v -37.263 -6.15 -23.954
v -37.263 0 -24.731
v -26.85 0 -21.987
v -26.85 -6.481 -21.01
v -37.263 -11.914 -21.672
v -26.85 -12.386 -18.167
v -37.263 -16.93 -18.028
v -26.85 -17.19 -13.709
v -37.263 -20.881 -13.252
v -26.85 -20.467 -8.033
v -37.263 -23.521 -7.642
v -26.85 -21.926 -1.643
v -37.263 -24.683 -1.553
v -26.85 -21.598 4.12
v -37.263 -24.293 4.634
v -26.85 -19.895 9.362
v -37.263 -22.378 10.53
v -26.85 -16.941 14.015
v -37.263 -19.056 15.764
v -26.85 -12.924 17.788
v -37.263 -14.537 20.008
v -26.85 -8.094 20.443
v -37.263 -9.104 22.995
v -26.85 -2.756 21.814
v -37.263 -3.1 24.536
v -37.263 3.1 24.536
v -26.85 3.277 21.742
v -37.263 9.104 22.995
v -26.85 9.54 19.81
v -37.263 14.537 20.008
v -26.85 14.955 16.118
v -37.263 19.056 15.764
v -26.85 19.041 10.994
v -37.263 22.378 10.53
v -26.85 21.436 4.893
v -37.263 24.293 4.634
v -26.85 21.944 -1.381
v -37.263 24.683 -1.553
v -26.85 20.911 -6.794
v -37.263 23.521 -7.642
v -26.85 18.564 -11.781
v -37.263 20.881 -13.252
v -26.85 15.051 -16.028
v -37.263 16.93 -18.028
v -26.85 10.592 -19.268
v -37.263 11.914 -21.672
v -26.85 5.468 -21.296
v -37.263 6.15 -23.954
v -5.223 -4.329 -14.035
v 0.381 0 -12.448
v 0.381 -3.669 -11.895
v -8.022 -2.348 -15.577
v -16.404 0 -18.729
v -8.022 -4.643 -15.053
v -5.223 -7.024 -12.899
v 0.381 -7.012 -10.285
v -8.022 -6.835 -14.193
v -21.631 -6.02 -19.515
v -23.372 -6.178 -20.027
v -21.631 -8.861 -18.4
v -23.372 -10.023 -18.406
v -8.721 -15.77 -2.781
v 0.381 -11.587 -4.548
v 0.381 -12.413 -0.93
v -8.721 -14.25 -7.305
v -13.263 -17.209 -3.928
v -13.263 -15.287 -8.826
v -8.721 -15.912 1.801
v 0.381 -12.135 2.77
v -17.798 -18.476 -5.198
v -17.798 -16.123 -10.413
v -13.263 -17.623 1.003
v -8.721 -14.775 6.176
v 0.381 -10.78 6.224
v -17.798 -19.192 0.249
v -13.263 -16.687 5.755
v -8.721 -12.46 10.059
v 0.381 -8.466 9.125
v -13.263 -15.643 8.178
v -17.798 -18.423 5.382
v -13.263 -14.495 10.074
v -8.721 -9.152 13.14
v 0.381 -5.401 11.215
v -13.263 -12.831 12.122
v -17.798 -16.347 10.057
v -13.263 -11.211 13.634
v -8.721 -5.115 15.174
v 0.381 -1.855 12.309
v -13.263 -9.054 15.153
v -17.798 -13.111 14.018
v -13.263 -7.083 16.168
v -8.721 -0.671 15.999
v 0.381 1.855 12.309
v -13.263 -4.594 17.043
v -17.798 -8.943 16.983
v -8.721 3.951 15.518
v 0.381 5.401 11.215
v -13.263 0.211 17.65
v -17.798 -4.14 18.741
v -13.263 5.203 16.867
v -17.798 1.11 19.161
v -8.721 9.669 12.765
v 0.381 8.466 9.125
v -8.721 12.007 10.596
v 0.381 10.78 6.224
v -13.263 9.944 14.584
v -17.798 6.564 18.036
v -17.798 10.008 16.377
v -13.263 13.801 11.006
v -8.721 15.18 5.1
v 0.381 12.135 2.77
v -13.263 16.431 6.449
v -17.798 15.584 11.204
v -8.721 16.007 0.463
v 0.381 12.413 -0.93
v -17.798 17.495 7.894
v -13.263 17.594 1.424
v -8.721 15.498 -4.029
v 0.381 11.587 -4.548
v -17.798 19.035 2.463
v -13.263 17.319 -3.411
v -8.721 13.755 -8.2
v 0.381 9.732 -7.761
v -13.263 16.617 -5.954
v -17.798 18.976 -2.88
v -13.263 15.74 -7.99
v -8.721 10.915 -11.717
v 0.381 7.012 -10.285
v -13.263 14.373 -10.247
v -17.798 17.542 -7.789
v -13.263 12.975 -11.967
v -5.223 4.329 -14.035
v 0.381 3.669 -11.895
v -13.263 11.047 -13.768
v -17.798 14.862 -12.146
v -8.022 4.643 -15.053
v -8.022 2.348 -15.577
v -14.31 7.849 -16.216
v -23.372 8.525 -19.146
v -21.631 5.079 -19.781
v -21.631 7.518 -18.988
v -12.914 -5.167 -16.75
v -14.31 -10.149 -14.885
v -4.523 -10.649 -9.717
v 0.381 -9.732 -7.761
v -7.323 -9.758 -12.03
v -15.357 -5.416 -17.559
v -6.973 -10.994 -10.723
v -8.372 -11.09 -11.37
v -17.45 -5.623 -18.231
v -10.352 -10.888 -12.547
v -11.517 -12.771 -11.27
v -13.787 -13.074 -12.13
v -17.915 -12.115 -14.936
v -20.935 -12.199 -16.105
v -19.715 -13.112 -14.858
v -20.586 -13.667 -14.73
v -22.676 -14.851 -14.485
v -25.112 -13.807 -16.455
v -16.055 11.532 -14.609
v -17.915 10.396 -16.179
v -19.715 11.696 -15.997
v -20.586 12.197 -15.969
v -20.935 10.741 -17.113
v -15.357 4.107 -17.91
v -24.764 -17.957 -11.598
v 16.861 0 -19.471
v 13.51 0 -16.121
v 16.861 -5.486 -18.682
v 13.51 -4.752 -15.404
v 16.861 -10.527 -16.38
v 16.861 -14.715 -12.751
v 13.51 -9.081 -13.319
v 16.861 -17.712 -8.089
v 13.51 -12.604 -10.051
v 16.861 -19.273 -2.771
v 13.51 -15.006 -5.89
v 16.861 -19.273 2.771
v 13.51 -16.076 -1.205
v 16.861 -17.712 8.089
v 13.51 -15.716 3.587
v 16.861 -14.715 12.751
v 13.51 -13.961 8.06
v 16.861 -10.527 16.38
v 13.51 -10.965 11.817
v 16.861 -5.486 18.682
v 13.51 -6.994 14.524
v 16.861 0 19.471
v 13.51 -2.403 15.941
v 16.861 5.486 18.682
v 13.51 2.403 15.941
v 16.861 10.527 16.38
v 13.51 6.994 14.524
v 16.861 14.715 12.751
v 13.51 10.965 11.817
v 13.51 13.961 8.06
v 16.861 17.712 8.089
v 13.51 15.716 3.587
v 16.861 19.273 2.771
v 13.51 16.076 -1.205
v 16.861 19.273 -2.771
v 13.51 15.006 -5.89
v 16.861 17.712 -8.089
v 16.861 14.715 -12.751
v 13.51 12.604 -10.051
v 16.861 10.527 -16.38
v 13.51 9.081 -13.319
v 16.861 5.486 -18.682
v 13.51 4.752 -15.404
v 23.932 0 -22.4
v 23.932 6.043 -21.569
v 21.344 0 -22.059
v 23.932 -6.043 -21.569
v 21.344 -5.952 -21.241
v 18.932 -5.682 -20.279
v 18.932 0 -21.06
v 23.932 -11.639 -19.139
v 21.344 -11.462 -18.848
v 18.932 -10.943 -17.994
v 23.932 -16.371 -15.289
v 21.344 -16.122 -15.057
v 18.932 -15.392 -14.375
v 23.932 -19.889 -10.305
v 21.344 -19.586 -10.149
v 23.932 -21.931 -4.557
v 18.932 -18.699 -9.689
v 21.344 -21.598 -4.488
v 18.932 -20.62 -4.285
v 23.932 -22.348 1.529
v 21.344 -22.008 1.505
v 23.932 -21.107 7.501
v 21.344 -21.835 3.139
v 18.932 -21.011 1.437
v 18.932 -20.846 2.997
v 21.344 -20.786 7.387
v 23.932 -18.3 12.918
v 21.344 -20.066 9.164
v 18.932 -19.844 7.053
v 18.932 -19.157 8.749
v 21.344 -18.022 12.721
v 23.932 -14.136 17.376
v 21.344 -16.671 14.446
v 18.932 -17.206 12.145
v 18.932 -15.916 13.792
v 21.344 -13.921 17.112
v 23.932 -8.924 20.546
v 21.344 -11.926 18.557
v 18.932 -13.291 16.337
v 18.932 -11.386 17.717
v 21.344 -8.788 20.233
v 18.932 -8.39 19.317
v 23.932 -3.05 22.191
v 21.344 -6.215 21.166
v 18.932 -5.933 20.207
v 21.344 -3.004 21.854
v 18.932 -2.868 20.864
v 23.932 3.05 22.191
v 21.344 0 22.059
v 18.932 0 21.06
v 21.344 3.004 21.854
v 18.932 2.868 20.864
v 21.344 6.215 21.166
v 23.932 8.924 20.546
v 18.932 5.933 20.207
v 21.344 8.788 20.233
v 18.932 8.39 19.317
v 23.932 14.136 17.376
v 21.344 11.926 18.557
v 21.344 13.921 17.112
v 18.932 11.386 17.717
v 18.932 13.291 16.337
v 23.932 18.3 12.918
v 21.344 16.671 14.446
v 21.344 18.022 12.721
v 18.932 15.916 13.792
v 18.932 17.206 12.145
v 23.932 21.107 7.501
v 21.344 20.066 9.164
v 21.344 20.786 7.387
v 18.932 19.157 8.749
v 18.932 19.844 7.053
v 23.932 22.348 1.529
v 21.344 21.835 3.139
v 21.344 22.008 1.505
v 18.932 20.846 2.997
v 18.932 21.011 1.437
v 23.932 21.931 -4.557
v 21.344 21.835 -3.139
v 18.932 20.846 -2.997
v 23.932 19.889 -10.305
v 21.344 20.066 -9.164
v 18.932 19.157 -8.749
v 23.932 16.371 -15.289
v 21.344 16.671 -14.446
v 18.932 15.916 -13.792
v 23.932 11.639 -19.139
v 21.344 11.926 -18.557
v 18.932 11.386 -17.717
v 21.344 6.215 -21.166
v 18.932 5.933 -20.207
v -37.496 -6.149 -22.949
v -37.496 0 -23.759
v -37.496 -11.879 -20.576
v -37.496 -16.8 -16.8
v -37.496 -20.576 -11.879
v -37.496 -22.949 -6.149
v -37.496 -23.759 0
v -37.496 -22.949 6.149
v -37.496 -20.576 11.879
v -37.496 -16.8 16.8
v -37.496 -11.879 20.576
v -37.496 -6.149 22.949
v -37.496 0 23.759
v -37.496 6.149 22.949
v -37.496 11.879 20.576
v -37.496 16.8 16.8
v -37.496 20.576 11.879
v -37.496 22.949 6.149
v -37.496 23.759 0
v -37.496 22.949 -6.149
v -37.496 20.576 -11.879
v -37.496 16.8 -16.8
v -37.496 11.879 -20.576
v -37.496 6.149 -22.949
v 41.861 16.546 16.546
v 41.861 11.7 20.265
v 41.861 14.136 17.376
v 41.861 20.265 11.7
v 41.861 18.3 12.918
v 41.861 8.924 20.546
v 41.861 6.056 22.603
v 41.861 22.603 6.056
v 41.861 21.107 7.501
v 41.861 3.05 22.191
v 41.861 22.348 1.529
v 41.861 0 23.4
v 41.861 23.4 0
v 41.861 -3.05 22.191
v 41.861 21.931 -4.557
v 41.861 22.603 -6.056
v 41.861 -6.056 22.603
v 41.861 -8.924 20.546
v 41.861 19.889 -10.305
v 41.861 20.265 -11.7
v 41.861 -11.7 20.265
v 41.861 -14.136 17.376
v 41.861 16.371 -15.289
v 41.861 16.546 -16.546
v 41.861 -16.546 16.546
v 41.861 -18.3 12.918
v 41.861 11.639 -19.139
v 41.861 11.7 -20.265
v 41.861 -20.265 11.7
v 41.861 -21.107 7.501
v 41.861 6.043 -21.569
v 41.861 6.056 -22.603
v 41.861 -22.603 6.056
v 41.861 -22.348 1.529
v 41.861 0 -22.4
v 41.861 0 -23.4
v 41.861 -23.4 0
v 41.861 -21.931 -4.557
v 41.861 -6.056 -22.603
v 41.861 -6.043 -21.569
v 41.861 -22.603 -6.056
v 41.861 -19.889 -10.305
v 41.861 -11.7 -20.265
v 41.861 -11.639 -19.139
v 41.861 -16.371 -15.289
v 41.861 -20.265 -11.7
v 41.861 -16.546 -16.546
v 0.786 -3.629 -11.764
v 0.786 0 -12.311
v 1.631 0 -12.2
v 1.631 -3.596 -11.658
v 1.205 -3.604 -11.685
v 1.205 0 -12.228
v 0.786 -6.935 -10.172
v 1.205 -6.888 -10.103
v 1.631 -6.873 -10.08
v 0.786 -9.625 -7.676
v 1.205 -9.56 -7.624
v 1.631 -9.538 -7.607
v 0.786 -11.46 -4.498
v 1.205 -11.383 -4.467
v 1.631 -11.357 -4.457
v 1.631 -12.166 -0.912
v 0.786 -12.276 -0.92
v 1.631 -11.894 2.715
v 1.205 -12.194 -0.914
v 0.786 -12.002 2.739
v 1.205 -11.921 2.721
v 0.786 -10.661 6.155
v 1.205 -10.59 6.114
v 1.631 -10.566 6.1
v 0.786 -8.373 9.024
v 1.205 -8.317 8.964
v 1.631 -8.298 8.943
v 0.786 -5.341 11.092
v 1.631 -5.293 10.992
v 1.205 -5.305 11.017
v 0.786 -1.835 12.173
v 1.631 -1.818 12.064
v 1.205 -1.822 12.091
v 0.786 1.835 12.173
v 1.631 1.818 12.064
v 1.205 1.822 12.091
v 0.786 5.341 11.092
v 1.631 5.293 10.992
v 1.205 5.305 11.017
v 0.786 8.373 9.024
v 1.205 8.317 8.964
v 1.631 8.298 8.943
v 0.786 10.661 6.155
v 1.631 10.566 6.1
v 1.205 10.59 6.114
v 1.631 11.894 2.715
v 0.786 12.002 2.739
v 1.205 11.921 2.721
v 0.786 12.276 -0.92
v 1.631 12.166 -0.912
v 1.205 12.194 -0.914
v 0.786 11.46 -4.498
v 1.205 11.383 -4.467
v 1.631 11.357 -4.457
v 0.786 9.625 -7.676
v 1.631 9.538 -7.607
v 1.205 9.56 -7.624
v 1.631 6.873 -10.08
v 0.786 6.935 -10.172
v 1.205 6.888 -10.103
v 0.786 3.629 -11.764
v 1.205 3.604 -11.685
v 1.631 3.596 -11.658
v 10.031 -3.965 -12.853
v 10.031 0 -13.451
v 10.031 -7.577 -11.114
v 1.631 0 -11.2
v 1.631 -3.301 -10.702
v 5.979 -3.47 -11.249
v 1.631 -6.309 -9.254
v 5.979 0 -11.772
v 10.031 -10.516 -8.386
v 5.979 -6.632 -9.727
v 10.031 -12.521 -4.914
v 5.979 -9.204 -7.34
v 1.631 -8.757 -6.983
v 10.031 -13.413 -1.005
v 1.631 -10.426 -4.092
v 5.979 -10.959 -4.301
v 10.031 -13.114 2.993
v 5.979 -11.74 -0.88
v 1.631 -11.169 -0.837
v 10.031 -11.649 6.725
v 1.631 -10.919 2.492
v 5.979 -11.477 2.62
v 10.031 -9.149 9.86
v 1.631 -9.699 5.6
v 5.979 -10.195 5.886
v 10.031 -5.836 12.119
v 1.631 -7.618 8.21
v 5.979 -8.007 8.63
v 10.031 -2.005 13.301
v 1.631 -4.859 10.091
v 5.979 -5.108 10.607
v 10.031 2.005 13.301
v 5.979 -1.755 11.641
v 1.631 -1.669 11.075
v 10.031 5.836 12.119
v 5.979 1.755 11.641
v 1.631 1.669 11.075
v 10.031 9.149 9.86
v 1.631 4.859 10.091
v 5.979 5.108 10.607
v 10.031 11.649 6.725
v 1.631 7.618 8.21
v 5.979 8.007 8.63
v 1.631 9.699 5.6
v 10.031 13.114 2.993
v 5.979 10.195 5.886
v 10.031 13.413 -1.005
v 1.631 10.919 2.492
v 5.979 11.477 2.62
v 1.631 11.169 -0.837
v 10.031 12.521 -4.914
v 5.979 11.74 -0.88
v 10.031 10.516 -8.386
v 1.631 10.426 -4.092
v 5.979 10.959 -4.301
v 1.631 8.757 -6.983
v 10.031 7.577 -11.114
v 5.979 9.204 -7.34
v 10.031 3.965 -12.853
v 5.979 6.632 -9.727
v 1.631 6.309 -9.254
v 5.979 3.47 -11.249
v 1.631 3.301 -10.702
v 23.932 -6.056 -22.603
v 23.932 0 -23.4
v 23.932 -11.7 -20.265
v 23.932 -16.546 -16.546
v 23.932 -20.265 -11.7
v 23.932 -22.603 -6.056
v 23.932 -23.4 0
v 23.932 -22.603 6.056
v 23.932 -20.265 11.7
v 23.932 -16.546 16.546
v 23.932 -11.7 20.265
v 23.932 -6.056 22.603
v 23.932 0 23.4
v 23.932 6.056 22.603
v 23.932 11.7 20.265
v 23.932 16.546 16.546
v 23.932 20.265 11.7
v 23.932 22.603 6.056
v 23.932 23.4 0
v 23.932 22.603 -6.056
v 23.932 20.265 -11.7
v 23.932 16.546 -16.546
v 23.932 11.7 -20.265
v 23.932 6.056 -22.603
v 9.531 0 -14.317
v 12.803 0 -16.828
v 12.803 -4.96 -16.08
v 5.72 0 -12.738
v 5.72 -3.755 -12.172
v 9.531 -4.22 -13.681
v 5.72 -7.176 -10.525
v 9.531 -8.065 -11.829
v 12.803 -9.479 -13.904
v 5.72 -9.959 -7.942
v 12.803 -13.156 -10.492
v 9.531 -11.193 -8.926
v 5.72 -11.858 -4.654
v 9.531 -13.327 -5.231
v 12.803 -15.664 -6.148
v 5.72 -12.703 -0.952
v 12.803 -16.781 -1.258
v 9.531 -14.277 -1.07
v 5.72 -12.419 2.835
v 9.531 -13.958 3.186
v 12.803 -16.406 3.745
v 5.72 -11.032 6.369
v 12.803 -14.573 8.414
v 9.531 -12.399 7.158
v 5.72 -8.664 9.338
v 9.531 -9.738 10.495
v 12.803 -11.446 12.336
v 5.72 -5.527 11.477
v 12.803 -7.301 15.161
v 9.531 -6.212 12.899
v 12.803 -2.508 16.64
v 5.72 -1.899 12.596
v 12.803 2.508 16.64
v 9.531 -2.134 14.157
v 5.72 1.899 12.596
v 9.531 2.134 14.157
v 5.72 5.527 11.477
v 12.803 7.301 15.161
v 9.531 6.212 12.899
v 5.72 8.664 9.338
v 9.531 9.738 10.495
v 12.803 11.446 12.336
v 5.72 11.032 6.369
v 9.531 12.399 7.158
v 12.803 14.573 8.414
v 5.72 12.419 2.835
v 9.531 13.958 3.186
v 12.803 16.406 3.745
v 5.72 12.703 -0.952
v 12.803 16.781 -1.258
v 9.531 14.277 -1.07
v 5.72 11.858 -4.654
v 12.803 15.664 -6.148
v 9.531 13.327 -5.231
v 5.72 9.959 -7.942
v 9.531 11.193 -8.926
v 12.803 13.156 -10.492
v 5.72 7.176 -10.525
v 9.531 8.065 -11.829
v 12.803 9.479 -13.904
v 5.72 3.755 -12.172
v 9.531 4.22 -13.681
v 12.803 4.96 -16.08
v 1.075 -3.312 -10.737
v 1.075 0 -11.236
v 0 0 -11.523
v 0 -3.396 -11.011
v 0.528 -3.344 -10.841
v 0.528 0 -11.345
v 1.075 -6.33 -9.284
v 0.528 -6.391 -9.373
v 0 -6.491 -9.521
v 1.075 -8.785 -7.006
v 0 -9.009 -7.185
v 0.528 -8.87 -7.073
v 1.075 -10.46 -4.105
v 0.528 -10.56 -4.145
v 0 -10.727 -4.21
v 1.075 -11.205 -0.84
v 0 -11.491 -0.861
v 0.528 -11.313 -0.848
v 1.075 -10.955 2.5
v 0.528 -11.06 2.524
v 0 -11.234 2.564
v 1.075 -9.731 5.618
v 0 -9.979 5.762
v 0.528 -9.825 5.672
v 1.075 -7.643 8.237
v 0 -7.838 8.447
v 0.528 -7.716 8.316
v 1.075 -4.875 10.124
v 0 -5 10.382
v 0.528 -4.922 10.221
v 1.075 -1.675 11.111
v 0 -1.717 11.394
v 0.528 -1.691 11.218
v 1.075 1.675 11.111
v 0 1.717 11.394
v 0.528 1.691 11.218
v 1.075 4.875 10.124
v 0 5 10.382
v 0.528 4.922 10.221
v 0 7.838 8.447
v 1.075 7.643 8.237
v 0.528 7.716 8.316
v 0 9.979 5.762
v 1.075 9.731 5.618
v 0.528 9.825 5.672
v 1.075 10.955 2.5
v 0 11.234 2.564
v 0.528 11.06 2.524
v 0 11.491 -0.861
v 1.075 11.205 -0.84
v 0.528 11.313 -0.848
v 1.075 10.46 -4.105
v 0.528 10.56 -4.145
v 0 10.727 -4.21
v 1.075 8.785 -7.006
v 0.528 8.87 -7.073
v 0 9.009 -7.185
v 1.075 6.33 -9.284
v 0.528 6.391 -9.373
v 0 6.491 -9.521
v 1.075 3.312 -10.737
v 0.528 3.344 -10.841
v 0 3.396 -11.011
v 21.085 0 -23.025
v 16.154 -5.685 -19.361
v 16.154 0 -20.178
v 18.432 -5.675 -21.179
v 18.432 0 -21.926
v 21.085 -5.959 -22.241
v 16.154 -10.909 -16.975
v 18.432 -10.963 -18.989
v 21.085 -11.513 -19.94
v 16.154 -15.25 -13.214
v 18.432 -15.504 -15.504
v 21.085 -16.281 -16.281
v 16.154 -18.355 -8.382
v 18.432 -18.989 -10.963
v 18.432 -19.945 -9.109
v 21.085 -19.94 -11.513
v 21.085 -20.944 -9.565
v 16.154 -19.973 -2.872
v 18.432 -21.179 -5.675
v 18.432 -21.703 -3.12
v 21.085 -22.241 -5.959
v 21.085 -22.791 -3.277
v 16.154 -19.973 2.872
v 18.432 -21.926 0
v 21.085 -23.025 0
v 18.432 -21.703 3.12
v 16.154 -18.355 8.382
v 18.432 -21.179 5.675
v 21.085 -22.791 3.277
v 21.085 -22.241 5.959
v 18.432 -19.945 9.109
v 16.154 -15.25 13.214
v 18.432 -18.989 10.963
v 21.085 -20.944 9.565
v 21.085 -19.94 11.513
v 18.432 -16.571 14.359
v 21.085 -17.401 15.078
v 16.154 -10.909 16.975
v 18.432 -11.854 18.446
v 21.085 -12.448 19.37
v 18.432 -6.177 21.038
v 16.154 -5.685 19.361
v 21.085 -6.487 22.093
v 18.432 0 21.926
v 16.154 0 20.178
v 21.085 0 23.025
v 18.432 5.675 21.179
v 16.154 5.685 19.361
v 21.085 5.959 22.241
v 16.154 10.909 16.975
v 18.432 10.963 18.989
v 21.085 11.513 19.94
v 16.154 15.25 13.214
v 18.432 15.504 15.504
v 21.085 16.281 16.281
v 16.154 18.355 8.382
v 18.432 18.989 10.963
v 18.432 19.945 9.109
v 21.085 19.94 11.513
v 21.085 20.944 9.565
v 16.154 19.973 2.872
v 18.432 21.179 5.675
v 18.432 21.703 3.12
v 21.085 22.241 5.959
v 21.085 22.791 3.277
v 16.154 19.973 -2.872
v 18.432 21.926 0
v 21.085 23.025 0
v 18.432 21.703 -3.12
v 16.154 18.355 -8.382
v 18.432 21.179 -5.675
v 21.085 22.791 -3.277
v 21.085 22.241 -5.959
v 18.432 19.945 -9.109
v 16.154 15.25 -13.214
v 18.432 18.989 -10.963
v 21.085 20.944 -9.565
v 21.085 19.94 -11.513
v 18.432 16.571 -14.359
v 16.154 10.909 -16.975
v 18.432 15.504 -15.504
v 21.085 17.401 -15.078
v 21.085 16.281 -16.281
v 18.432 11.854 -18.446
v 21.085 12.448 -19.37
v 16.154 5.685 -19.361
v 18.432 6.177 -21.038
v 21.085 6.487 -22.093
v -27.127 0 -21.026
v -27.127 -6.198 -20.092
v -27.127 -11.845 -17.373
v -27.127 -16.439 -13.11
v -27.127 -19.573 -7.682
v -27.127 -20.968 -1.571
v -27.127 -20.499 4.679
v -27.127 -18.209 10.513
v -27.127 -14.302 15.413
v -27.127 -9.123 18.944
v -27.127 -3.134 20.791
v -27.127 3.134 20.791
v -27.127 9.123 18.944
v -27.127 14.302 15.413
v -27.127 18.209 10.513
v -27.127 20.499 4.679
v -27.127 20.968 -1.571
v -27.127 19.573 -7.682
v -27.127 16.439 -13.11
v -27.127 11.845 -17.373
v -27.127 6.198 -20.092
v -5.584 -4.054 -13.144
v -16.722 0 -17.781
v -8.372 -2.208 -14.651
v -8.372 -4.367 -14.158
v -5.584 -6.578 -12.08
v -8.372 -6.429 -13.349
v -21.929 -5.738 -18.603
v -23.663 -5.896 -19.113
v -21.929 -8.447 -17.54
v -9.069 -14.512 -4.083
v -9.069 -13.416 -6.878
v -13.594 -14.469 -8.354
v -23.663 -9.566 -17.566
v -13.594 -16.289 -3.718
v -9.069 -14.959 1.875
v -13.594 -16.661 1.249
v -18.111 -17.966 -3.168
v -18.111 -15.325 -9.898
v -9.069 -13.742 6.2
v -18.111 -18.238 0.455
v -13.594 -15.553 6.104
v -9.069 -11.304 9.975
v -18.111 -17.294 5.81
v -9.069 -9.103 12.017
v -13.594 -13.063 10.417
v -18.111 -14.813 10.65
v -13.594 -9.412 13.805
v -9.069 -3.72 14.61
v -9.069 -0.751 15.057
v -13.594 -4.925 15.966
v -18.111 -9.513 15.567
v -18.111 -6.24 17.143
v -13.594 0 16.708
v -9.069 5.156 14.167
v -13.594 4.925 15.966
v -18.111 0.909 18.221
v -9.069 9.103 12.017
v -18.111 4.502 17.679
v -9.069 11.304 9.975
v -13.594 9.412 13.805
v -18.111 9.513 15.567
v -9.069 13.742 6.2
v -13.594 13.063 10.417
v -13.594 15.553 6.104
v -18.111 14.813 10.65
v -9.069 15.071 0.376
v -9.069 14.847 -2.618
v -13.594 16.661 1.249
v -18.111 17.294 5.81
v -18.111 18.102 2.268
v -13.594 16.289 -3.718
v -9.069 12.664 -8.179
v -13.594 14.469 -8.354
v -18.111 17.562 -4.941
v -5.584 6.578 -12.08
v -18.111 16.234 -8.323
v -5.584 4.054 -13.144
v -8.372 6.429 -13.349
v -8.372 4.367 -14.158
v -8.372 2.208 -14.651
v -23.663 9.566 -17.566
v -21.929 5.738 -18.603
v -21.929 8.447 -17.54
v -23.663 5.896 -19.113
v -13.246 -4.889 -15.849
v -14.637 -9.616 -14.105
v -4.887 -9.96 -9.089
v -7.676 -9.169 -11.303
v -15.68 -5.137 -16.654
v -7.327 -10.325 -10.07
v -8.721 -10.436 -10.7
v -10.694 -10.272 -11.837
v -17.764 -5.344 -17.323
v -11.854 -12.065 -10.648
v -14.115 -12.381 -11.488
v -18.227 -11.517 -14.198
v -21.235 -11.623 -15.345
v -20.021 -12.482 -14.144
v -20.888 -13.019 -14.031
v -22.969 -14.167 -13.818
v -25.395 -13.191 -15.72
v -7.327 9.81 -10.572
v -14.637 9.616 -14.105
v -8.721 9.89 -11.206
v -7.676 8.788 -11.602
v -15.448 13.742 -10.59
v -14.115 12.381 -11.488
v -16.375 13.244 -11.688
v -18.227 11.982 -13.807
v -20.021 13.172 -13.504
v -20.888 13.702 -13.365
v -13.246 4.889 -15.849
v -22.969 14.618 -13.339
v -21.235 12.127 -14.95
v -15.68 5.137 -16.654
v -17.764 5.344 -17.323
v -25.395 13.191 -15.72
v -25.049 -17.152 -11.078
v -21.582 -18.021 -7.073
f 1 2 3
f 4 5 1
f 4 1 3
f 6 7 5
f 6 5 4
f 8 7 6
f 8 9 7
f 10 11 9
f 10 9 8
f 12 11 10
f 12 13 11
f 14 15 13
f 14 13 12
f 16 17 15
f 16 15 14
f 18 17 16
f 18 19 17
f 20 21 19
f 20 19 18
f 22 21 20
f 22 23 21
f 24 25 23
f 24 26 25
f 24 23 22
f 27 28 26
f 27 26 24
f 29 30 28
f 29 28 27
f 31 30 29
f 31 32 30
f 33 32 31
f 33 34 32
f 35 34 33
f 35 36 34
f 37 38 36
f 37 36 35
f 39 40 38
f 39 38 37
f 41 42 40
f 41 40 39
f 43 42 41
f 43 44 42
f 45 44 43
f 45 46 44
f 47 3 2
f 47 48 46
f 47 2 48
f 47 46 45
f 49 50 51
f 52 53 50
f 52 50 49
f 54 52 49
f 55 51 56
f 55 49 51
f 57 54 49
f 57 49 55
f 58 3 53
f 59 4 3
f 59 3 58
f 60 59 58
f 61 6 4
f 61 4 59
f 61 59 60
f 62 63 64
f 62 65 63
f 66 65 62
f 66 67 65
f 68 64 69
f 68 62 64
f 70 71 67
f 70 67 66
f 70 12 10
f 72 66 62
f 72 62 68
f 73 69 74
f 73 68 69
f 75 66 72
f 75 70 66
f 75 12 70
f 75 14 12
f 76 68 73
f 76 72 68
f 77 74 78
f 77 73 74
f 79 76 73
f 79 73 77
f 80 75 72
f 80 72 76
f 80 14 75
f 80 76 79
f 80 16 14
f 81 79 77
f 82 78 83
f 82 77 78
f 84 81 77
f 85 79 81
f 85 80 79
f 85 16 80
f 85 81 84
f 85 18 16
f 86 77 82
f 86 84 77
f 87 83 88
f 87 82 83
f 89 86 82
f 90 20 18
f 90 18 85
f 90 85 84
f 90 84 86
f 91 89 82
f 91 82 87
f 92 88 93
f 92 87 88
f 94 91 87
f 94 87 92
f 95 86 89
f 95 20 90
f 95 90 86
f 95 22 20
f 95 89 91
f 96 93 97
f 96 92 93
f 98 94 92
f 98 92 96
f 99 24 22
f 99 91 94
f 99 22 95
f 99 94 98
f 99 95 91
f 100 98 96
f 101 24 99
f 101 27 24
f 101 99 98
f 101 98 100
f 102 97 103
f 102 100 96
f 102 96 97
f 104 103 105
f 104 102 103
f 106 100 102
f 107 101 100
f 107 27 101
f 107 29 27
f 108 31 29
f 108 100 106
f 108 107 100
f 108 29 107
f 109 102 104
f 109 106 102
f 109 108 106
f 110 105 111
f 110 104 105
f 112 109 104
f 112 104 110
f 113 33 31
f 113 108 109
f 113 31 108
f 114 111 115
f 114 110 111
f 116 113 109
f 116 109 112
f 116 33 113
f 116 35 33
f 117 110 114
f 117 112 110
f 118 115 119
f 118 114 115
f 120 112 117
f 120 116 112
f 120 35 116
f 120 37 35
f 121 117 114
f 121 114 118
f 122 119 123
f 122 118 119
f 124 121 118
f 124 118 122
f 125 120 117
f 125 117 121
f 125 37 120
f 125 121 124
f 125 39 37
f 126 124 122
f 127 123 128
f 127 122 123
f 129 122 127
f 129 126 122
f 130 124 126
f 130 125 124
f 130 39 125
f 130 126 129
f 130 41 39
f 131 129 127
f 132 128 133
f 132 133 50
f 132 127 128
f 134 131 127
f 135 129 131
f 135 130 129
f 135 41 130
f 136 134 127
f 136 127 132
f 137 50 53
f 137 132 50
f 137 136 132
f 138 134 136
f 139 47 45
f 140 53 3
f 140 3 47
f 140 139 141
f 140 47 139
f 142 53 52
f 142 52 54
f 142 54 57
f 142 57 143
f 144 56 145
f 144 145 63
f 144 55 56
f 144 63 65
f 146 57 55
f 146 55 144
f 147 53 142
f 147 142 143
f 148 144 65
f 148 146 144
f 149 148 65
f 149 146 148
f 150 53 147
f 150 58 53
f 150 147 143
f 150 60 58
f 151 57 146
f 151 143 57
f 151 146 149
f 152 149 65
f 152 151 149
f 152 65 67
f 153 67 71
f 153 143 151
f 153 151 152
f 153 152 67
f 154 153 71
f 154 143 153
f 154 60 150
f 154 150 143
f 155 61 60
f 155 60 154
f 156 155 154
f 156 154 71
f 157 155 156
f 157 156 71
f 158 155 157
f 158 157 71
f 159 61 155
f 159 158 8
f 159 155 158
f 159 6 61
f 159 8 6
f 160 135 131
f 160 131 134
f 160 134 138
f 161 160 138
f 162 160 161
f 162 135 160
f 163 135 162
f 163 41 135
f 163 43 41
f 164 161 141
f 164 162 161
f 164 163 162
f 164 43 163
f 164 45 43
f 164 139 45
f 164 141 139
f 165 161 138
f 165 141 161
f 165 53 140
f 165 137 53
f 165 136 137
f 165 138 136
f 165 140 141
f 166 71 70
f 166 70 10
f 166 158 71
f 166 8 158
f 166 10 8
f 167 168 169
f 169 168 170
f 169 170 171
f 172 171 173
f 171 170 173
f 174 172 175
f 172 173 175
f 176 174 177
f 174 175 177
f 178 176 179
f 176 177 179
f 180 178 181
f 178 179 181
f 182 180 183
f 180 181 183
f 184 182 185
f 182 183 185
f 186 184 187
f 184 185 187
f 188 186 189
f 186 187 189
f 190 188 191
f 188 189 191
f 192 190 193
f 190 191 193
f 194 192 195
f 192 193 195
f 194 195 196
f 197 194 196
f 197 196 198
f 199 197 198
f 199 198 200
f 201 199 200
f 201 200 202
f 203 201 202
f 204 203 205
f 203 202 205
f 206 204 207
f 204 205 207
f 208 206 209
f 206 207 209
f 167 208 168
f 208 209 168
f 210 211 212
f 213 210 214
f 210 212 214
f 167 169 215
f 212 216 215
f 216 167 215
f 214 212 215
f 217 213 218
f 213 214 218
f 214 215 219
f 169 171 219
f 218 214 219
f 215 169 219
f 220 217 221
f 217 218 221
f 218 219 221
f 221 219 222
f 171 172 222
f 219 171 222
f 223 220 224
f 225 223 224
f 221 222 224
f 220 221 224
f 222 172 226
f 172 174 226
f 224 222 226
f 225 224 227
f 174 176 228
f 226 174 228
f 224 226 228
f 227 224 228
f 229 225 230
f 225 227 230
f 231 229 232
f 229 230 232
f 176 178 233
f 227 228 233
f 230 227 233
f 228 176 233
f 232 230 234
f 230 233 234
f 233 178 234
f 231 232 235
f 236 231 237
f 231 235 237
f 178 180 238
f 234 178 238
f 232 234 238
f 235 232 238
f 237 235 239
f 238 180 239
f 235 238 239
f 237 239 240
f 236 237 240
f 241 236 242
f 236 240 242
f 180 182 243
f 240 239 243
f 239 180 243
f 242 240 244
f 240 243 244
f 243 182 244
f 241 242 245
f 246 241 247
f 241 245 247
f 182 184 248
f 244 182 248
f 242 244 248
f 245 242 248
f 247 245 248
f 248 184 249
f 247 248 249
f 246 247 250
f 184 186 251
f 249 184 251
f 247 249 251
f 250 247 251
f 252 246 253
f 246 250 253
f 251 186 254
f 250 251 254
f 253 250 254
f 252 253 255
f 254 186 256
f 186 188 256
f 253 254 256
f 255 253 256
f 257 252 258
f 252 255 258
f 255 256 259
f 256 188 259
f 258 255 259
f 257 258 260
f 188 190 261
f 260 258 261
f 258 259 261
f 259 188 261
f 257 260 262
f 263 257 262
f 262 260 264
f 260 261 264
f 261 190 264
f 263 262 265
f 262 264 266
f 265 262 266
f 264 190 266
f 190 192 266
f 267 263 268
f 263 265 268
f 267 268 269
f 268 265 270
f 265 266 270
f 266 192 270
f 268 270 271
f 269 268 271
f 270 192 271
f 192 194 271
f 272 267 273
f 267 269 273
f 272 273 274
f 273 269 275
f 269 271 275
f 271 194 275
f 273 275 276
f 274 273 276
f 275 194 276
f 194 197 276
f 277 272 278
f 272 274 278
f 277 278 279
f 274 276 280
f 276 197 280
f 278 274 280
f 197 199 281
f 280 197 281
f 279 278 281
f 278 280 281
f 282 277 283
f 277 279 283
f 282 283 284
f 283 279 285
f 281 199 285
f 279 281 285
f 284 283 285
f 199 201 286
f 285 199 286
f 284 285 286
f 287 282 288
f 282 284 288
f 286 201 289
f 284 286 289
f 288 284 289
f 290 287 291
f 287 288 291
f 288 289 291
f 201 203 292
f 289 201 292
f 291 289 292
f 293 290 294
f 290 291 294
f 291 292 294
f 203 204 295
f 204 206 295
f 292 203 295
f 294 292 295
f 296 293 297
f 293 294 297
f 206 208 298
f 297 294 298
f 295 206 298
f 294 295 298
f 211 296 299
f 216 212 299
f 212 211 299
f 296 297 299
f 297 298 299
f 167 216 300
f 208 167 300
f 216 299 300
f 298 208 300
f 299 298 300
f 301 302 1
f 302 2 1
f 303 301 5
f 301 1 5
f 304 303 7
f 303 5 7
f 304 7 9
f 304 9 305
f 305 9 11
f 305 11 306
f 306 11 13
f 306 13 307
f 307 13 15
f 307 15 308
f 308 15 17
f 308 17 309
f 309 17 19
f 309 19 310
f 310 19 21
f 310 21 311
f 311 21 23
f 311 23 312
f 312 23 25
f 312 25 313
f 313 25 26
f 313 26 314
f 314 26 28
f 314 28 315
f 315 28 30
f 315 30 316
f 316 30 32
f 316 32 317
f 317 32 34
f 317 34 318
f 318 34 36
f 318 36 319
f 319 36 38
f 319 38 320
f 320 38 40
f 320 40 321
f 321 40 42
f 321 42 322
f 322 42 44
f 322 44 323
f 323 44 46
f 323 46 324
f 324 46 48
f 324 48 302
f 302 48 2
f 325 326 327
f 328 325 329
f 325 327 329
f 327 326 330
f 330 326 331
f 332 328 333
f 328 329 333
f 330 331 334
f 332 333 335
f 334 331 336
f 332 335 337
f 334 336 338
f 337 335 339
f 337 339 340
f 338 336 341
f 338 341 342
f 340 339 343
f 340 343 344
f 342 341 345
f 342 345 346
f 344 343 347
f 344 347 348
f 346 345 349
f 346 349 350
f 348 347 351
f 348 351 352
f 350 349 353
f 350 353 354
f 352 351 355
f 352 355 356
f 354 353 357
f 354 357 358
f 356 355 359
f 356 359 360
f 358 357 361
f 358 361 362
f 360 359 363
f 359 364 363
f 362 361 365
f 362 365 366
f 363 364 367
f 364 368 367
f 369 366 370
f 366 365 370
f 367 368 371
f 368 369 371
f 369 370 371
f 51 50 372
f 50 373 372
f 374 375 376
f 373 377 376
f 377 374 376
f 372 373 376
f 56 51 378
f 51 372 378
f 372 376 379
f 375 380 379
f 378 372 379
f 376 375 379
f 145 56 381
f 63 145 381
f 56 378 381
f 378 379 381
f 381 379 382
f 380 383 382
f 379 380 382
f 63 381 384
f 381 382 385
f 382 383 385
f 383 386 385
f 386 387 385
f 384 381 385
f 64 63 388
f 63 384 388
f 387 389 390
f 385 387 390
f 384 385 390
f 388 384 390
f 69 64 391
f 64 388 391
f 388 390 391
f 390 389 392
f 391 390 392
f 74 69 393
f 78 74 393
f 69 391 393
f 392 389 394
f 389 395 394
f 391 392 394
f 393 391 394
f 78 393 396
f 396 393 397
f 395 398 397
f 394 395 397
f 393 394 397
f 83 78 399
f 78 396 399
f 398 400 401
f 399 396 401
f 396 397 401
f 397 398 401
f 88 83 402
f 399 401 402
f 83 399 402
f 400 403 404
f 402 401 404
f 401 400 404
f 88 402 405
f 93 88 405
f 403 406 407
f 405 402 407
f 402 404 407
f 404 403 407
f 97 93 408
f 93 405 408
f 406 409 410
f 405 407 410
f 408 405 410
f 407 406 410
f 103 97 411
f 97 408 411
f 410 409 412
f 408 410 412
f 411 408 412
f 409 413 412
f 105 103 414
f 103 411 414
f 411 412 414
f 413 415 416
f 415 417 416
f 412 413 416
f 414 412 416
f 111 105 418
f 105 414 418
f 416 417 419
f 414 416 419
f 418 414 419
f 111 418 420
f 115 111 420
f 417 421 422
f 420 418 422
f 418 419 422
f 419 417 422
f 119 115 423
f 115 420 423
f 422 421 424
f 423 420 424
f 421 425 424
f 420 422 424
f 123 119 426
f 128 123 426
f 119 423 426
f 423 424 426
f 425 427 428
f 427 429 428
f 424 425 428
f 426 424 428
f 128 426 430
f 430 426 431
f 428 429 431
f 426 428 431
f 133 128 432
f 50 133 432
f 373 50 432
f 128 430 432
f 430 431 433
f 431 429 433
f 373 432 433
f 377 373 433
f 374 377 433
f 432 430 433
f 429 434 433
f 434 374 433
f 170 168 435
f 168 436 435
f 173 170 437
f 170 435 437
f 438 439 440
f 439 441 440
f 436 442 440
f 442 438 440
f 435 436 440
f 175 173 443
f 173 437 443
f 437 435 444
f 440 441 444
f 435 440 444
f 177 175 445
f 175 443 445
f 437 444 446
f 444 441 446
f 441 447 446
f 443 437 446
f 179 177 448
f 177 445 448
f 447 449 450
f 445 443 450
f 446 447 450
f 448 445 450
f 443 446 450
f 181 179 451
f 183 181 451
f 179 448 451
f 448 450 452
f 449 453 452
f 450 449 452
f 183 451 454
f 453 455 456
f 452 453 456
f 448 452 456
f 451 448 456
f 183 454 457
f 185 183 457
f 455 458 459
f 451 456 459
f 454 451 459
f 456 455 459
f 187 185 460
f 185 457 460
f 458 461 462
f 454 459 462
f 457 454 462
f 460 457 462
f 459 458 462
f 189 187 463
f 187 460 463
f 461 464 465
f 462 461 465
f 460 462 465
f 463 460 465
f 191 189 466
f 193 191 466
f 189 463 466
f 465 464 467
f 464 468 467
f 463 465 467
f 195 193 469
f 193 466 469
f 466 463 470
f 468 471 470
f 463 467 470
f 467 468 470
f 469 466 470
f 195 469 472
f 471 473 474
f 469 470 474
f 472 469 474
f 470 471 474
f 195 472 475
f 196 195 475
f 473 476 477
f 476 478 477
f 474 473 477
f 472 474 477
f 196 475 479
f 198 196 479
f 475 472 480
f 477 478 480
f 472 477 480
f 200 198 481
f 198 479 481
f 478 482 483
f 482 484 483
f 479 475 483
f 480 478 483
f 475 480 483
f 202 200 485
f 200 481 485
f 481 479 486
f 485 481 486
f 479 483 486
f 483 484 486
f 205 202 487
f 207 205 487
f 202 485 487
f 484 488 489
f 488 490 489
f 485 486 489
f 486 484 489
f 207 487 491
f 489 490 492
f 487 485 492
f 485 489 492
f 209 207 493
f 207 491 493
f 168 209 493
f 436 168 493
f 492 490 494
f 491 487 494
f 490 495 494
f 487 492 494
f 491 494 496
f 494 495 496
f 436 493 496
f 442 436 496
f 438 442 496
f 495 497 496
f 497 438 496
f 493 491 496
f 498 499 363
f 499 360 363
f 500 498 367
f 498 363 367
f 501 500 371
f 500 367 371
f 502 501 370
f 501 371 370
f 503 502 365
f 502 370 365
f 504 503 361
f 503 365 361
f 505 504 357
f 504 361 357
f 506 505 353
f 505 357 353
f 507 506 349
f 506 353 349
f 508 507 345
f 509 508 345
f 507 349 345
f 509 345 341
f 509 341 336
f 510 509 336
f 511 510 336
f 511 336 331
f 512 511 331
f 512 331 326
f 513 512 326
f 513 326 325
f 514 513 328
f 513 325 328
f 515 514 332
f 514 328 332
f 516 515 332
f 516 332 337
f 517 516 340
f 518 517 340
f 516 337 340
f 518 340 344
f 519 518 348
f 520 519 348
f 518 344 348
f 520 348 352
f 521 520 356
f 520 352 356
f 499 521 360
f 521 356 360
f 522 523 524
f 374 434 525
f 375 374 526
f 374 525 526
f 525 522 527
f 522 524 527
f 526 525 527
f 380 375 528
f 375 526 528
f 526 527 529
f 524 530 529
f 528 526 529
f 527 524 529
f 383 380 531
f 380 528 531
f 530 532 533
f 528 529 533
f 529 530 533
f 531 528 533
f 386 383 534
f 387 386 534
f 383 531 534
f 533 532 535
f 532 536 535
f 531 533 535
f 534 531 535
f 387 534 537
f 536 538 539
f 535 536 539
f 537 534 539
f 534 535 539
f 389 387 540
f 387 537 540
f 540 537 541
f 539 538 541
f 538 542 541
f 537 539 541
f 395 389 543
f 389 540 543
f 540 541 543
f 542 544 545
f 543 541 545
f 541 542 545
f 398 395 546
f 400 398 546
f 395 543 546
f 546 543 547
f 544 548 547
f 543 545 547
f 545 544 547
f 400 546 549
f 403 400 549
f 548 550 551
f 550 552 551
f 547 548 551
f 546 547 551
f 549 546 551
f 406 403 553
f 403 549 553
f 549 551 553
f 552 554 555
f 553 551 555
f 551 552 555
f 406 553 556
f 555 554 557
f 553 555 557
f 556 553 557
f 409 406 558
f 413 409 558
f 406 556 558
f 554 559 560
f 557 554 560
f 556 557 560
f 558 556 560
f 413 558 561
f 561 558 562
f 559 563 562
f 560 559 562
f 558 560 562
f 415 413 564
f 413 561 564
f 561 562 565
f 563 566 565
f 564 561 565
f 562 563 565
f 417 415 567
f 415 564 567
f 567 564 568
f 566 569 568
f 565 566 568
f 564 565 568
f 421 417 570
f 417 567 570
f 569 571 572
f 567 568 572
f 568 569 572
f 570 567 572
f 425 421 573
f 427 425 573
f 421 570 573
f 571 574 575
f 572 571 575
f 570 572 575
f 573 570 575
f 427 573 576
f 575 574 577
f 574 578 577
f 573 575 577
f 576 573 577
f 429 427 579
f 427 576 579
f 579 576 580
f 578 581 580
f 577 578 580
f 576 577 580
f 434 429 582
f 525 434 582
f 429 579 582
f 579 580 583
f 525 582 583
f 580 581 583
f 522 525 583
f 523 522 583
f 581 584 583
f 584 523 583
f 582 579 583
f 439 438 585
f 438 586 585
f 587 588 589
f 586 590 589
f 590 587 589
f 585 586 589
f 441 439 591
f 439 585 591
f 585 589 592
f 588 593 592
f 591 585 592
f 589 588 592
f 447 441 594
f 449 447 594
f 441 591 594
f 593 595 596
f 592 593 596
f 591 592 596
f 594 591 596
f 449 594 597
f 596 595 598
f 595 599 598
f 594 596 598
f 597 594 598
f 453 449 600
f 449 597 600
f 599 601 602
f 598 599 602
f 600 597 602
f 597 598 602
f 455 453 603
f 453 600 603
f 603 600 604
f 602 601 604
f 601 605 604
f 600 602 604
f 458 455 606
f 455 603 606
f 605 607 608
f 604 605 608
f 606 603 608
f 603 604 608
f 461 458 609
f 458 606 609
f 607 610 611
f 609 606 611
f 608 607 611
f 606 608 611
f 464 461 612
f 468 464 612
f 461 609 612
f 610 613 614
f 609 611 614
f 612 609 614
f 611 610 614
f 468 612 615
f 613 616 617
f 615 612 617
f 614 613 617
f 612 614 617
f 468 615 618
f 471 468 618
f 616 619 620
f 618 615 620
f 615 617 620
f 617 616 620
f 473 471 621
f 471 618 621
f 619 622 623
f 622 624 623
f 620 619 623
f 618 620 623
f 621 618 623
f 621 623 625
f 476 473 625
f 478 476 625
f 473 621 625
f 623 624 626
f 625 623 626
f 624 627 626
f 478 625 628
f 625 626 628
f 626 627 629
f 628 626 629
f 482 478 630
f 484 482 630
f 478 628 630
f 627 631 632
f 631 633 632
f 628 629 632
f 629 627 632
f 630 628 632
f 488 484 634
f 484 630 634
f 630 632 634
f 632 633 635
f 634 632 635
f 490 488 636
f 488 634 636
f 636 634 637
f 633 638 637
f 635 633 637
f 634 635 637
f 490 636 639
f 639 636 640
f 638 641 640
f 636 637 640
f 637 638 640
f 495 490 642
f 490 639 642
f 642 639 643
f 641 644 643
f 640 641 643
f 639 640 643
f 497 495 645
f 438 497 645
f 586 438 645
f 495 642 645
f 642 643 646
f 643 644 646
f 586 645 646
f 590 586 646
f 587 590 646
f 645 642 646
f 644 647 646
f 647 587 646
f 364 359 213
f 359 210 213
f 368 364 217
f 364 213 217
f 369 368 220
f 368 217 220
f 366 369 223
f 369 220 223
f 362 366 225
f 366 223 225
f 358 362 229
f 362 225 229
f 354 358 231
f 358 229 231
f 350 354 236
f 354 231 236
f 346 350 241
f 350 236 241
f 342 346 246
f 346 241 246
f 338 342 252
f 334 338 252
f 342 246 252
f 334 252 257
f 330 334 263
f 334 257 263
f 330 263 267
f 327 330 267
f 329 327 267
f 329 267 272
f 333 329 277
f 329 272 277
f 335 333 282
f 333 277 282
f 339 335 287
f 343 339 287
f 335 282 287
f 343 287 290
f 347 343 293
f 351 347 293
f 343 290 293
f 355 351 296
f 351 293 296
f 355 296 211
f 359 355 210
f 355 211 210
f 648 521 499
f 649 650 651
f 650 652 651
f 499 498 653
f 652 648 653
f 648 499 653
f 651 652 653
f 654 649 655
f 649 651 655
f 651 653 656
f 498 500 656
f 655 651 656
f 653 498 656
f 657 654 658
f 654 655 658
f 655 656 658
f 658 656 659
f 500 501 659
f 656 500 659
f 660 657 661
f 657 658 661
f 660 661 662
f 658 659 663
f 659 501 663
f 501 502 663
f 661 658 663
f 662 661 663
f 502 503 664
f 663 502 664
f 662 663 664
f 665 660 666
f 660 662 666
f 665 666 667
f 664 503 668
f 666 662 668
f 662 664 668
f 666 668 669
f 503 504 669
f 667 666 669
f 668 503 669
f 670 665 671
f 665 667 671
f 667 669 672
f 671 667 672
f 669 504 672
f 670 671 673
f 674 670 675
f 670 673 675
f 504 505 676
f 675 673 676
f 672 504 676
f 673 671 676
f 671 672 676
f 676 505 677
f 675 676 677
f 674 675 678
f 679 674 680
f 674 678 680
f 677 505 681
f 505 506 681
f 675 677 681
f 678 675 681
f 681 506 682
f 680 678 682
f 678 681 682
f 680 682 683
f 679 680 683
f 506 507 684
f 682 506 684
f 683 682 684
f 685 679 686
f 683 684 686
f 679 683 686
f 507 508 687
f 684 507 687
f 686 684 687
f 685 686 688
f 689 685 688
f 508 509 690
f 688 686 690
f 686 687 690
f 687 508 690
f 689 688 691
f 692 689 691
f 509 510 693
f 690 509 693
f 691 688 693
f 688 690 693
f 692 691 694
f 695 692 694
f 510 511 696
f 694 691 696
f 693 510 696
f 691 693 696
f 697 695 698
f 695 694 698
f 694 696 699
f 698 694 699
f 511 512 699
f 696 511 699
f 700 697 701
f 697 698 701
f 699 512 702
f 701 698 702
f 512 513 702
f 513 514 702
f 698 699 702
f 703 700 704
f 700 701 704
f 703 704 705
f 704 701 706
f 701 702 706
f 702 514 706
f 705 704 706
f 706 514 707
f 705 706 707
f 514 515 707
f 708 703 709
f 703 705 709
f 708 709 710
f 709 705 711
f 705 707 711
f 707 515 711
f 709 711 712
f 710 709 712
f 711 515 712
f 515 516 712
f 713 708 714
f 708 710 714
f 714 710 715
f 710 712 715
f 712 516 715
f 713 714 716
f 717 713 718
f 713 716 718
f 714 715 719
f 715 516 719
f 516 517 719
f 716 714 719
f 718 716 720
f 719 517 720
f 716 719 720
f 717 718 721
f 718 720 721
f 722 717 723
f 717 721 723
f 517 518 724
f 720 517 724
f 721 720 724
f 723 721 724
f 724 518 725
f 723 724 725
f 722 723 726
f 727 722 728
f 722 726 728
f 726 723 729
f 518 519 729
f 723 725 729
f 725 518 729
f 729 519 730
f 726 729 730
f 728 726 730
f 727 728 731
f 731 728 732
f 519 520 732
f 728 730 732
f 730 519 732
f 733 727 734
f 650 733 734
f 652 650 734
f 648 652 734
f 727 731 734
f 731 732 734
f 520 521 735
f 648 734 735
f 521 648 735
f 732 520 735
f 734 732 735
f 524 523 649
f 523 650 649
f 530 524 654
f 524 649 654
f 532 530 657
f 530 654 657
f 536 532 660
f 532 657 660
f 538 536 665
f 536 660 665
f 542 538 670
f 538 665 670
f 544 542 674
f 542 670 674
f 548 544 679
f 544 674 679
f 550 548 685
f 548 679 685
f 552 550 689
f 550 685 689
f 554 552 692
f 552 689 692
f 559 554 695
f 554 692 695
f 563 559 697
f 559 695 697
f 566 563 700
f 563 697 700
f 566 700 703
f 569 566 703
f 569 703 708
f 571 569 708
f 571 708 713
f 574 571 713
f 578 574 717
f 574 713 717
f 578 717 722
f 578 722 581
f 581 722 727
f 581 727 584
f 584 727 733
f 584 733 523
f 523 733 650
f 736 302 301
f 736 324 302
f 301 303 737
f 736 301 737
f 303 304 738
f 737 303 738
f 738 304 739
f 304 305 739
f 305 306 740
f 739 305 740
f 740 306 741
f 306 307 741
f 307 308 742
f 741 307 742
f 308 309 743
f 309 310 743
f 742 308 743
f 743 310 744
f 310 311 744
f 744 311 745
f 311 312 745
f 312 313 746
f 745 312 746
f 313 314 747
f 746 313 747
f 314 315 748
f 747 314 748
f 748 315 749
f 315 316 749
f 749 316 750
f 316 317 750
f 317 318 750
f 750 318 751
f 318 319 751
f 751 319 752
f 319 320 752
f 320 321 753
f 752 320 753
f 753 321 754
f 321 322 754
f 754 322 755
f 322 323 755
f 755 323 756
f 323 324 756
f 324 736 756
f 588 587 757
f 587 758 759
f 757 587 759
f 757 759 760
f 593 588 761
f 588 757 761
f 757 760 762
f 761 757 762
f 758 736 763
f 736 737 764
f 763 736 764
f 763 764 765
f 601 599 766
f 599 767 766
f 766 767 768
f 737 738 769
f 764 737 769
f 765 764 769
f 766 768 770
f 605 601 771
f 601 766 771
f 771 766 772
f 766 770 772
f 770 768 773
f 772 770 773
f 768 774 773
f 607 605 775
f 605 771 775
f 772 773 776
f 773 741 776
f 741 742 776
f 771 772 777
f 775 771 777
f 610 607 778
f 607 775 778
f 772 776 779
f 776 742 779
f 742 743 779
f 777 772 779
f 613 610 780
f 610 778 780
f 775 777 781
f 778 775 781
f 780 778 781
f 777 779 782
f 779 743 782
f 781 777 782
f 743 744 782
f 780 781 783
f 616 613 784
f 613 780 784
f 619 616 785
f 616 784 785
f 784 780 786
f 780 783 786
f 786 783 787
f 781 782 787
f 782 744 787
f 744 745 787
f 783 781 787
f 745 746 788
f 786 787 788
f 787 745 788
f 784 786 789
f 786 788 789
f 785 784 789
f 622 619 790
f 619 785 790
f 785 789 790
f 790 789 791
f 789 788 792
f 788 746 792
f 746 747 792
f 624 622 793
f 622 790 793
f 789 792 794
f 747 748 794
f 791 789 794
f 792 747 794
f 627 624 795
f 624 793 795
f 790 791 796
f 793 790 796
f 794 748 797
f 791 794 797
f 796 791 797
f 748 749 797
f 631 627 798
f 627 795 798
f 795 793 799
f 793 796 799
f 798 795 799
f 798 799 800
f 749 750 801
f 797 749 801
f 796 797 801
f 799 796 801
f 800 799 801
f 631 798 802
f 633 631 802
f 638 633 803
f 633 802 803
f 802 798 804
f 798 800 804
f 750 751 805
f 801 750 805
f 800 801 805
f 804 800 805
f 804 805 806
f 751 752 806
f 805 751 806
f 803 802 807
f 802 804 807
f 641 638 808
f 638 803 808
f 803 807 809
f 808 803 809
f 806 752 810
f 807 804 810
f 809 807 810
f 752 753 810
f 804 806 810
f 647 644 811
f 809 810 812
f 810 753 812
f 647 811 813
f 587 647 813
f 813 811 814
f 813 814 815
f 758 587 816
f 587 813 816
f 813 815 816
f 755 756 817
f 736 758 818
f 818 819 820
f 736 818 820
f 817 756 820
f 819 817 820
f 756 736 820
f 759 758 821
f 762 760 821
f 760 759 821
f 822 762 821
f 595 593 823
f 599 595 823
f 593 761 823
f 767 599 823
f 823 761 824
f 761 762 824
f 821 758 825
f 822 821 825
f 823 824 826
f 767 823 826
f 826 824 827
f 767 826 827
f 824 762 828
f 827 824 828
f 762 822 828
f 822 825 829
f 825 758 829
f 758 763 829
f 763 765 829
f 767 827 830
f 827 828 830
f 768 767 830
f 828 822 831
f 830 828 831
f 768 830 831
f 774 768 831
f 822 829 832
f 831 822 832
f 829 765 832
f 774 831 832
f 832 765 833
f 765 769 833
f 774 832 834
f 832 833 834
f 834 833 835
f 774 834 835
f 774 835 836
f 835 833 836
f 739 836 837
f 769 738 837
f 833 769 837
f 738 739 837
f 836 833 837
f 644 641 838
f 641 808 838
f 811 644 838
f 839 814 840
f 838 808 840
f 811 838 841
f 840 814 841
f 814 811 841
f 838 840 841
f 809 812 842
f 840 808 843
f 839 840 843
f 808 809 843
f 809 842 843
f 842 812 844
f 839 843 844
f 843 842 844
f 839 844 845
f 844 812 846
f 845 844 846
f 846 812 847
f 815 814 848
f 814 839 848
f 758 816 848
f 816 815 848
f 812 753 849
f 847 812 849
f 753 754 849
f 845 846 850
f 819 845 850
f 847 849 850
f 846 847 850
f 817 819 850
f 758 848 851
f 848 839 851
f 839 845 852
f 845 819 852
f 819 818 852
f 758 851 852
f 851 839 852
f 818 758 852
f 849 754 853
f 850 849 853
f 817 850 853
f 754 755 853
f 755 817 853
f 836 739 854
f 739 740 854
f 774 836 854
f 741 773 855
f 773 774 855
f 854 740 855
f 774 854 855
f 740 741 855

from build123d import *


with BuildPart() as part:
    # Sketch1 → Revolve1 (revolve)
    with BuildSketch(Plane.XY, mode=Mode.PRIVATE) as revolve1_sk:
        with BuildLine():
            Line((41.860840685, 22.4), (23.931908497, 22.4))
            ThreePointArc((23.931908497, 22.4), (20.105074173, 21.638795325), (16.860840685, 19.471067812))
            Line((16.860840685, 19.471067812), (13.510378949, 16.120606076))
            ThreePointArc((13.510378949, 16.120606076), (8.060066689, 12.478823854), (1.630985025, 11.2))
            ThreePointArc((1.630985025, 11.2), (0.799647289, 11.281545925), (0, 11.523075183))
            add(Edge.make_bspline(
                [(0, 11.523075183), (-18.863821879, 19.301604743), (-37.496027464, 23.758787848)],
                knots=[0, 0, 0, 1, 1, 1], degree=2))
            Line((-37.496027464, 23.758787848), (-37.263372503, 24.731347188))
            add(Edge.make_bspline(
                [(0.381213777, 12.447562098), (-18.550314145, 20.254410518), (-37.263372503, 24.731347188)],
                knots=[0, 0, 0, 1, 1, 1], degree=2))
            ThreePointArc((0.381213777, 12.447562098), (0.993957717, 12.262486013), (1.630985025, 12.2))
            ThreePointArc((1.630985025, 12.2), (7.677383257, 13.402703386), (12.803272168, 16.827712857))
            Line((12.803272168, 16.827712857), (16.153733904, 20.178174593))
            ThreePointArc((16.153733904, 20.178174593), (19.722390741, 22.562674858), (23.931908497, 23.4))
            Line((23.931908497, 23.4), (41.860840685, 23.4))
            Line((41.860840685, 23.4), (41.860840685, 22.4))
        make_face()
    revolve(revolve1_sk.sketch.rotate(Axis((0, 0, 0), (-1, 0, 0)), 90), axis=Axis((0, 0, 0), (-1, 0, 0)))


solid = part.part
